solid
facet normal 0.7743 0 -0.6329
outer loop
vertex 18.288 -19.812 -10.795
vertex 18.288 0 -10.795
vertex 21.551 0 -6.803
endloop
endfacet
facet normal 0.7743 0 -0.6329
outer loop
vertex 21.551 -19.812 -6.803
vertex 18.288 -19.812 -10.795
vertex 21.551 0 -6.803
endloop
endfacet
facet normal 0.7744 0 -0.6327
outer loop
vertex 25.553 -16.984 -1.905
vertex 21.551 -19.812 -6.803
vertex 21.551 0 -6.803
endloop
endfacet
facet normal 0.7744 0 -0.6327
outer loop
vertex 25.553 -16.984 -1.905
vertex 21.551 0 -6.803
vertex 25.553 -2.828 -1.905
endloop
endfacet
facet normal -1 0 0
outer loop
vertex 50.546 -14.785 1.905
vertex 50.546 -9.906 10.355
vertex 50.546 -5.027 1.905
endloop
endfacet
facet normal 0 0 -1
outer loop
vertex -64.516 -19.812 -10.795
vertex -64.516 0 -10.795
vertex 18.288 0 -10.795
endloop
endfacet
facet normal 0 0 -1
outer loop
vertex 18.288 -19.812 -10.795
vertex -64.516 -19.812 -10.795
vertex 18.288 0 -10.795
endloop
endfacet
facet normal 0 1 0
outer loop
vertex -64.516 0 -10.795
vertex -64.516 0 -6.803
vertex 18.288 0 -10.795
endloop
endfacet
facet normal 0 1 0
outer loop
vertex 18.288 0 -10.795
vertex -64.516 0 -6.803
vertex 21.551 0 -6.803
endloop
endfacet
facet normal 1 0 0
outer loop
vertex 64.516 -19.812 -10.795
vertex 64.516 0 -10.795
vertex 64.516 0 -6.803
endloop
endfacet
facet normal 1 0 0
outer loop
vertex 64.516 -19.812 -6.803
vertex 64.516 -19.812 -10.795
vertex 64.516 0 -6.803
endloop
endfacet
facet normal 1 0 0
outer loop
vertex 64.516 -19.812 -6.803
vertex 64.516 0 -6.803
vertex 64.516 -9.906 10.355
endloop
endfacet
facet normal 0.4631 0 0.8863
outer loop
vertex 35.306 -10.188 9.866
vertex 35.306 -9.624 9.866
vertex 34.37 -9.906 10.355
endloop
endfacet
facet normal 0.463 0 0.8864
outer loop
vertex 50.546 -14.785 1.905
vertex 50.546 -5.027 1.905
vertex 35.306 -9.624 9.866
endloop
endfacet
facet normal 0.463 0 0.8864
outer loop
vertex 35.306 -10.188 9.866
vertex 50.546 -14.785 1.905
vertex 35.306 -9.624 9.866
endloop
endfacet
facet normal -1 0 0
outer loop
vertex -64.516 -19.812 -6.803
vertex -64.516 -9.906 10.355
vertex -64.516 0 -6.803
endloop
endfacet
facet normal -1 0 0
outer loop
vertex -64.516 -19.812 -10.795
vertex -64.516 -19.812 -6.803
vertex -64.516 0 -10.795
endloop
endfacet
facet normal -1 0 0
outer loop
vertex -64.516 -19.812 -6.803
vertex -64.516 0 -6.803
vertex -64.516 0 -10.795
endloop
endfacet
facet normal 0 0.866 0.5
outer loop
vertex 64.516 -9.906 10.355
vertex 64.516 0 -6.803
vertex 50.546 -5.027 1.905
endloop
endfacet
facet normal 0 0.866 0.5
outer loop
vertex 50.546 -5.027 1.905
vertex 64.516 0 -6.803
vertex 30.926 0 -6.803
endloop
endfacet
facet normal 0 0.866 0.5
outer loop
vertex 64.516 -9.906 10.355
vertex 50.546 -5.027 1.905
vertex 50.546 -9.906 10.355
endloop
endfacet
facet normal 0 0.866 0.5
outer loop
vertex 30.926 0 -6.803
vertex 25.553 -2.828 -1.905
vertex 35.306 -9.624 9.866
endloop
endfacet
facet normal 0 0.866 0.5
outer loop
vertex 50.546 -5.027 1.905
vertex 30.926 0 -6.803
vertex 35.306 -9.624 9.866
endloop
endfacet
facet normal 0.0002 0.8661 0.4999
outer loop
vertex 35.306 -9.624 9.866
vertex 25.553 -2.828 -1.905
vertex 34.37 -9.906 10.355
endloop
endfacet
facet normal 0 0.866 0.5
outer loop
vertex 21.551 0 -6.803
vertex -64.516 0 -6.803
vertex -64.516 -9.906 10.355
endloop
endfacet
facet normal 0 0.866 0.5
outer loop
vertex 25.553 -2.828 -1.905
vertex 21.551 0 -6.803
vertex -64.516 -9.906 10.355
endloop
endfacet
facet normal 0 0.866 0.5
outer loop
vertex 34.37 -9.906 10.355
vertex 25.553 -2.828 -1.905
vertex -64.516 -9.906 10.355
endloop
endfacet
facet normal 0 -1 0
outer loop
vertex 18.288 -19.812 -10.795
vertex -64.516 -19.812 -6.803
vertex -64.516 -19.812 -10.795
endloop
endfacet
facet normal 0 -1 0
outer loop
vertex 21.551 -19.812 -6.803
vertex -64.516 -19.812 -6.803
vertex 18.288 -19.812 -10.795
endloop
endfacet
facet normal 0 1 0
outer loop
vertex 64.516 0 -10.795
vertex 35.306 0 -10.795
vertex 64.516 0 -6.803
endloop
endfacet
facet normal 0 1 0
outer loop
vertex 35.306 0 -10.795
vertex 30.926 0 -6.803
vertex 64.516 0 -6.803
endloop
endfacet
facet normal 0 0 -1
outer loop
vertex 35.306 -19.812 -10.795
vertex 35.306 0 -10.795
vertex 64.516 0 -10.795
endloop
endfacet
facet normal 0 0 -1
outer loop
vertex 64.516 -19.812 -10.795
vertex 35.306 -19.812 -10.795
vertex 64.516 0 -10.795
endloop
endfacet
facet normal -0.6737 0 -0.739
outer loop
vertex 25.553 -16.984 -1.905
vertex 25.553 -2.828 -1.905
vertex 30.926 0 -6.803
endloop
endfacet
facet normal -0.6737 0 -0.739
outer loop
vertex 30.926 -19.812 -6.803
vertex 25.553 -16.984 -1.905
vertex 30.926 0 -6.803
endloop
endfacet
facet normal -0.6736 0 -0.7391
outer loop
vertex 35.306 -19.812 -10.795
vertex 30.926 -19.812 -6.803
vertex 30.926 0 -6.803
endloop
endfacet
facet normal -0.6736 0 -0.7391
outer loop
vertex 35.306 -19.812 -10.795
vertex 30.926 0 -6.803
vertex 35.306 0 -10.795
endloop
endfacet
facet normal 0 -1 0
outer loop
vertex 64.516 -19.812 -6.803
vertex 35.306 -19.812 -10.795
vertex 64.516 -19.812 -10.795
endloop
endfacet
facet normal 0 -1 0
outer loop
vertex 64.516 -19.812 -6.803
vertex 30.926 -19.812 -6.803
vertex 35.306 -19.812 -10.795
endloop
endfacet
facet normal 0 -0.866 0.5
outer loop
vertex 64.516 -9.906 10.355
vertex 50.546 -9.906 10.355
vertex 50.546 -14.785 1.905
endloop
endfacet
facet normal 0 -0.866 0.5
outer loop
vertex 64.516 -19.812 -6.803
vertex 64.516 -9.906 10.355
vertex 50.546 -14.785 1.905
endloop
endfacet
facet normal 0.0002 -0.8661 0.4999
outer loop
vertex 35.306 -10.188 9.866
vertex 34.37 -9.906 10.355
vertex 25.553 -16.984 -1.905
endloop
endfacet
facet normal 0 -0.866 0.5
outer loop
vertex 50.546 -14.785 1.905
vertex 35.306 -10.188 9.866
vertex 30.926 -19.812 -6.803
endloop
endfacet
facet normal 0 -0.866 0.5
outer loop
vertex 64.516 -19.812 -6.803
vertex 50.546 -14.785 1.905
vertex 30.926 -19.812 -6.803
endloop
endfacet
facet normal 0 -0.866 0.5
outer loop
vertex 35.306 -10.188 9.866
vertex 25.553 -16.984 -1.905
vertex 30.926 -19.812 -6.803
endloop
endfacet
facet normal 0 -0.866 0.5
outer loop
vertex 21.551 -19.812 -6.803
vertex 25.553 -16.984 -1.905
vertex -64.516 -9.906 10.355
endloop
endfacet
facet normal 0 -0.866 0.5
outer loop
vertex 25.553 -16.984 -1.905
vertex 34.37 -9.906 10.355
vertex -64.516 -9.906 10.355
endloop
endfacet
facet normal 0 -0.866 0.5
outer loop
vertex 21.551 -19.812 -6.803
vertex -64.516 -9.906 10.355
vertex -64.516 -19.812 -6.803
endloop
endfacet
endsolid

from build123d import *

# Parameters (mm, degrees)
F1_DEPTH    = 19.812
F2_T1_DEPTH = 189.0971878823
F3_T1_DEPTH = 189.0971878823
F3_T3_DEPTH = 105.0231878823


# Not quite as in the source:
# - a fillet or chamfer that OpenCascade refuses, or shapes differently, is made with other operations: its cross-section is extruded or revolved along the edge and cut away or added


with BuildPart() as f1:
    # F0 (on Front) → F1 (new body)
    with BuildSketch(Plane.XZ):
        Polygon((35.306, 9.8661940299), (33.528, 10.795), (-64.516, 10.795), (-64.516, -10.795), (18.288, -10.795), (25.5529864014, -1.905), (35.306, -10.795), align=None)
        Polygon((50.546, -10.795), (50.546, 1.905), (35.306, 9.8661940299), (35.306, -10.795), align=None)
        Polygon((64.516, -10.795), (64.516, 10.795), (50.546, 10.795), (50.546, 1.905), (50.546, -10.795), align=None)
    extrude(amount=F1_DEPTH)

    # F2: chamfer of 10.16 x 17.5976362049 on 1 edges, made by hand

    # F2_s2 → F2_t1 (cut)
    with BuildSketch(Plane.YZ.offset(-110.0425939411)):
        Polygon((-9.652, 10.795), (-19.812, -6.8026362049), (-19.812, 10.795), align=None)
    extrude(amount=F2_T1_DEPTH, mode=Mode.SUBTRACT)

    # F3: chamfer of 10.16 x 17.5976362049 on 2 edges, made by hand

    # F3_s2 → F3_t1 (cut)
    with BuildSketch(Plane.YZ.offset(-110.0425939411)):
        Polygon((0, -6.8026362049), (-10.16, 10.795), (0, 10.795), align=None)
    extrude(amount=F3_T1_DEPTH, mode=Mode.SUBTRACT)

    # F3_s4 → F3_t3 (cut)
    with BuildSketch(Plane.YZ.offset(5.0194060589)):
        Polygon((0, -6.8026362049), (-10.16, 10.795), (0, 10.795), align=None)
    extrude(amount=F3_T3_DEPTH, mode=Mode.SUBTRACT)


solid = f1.part
